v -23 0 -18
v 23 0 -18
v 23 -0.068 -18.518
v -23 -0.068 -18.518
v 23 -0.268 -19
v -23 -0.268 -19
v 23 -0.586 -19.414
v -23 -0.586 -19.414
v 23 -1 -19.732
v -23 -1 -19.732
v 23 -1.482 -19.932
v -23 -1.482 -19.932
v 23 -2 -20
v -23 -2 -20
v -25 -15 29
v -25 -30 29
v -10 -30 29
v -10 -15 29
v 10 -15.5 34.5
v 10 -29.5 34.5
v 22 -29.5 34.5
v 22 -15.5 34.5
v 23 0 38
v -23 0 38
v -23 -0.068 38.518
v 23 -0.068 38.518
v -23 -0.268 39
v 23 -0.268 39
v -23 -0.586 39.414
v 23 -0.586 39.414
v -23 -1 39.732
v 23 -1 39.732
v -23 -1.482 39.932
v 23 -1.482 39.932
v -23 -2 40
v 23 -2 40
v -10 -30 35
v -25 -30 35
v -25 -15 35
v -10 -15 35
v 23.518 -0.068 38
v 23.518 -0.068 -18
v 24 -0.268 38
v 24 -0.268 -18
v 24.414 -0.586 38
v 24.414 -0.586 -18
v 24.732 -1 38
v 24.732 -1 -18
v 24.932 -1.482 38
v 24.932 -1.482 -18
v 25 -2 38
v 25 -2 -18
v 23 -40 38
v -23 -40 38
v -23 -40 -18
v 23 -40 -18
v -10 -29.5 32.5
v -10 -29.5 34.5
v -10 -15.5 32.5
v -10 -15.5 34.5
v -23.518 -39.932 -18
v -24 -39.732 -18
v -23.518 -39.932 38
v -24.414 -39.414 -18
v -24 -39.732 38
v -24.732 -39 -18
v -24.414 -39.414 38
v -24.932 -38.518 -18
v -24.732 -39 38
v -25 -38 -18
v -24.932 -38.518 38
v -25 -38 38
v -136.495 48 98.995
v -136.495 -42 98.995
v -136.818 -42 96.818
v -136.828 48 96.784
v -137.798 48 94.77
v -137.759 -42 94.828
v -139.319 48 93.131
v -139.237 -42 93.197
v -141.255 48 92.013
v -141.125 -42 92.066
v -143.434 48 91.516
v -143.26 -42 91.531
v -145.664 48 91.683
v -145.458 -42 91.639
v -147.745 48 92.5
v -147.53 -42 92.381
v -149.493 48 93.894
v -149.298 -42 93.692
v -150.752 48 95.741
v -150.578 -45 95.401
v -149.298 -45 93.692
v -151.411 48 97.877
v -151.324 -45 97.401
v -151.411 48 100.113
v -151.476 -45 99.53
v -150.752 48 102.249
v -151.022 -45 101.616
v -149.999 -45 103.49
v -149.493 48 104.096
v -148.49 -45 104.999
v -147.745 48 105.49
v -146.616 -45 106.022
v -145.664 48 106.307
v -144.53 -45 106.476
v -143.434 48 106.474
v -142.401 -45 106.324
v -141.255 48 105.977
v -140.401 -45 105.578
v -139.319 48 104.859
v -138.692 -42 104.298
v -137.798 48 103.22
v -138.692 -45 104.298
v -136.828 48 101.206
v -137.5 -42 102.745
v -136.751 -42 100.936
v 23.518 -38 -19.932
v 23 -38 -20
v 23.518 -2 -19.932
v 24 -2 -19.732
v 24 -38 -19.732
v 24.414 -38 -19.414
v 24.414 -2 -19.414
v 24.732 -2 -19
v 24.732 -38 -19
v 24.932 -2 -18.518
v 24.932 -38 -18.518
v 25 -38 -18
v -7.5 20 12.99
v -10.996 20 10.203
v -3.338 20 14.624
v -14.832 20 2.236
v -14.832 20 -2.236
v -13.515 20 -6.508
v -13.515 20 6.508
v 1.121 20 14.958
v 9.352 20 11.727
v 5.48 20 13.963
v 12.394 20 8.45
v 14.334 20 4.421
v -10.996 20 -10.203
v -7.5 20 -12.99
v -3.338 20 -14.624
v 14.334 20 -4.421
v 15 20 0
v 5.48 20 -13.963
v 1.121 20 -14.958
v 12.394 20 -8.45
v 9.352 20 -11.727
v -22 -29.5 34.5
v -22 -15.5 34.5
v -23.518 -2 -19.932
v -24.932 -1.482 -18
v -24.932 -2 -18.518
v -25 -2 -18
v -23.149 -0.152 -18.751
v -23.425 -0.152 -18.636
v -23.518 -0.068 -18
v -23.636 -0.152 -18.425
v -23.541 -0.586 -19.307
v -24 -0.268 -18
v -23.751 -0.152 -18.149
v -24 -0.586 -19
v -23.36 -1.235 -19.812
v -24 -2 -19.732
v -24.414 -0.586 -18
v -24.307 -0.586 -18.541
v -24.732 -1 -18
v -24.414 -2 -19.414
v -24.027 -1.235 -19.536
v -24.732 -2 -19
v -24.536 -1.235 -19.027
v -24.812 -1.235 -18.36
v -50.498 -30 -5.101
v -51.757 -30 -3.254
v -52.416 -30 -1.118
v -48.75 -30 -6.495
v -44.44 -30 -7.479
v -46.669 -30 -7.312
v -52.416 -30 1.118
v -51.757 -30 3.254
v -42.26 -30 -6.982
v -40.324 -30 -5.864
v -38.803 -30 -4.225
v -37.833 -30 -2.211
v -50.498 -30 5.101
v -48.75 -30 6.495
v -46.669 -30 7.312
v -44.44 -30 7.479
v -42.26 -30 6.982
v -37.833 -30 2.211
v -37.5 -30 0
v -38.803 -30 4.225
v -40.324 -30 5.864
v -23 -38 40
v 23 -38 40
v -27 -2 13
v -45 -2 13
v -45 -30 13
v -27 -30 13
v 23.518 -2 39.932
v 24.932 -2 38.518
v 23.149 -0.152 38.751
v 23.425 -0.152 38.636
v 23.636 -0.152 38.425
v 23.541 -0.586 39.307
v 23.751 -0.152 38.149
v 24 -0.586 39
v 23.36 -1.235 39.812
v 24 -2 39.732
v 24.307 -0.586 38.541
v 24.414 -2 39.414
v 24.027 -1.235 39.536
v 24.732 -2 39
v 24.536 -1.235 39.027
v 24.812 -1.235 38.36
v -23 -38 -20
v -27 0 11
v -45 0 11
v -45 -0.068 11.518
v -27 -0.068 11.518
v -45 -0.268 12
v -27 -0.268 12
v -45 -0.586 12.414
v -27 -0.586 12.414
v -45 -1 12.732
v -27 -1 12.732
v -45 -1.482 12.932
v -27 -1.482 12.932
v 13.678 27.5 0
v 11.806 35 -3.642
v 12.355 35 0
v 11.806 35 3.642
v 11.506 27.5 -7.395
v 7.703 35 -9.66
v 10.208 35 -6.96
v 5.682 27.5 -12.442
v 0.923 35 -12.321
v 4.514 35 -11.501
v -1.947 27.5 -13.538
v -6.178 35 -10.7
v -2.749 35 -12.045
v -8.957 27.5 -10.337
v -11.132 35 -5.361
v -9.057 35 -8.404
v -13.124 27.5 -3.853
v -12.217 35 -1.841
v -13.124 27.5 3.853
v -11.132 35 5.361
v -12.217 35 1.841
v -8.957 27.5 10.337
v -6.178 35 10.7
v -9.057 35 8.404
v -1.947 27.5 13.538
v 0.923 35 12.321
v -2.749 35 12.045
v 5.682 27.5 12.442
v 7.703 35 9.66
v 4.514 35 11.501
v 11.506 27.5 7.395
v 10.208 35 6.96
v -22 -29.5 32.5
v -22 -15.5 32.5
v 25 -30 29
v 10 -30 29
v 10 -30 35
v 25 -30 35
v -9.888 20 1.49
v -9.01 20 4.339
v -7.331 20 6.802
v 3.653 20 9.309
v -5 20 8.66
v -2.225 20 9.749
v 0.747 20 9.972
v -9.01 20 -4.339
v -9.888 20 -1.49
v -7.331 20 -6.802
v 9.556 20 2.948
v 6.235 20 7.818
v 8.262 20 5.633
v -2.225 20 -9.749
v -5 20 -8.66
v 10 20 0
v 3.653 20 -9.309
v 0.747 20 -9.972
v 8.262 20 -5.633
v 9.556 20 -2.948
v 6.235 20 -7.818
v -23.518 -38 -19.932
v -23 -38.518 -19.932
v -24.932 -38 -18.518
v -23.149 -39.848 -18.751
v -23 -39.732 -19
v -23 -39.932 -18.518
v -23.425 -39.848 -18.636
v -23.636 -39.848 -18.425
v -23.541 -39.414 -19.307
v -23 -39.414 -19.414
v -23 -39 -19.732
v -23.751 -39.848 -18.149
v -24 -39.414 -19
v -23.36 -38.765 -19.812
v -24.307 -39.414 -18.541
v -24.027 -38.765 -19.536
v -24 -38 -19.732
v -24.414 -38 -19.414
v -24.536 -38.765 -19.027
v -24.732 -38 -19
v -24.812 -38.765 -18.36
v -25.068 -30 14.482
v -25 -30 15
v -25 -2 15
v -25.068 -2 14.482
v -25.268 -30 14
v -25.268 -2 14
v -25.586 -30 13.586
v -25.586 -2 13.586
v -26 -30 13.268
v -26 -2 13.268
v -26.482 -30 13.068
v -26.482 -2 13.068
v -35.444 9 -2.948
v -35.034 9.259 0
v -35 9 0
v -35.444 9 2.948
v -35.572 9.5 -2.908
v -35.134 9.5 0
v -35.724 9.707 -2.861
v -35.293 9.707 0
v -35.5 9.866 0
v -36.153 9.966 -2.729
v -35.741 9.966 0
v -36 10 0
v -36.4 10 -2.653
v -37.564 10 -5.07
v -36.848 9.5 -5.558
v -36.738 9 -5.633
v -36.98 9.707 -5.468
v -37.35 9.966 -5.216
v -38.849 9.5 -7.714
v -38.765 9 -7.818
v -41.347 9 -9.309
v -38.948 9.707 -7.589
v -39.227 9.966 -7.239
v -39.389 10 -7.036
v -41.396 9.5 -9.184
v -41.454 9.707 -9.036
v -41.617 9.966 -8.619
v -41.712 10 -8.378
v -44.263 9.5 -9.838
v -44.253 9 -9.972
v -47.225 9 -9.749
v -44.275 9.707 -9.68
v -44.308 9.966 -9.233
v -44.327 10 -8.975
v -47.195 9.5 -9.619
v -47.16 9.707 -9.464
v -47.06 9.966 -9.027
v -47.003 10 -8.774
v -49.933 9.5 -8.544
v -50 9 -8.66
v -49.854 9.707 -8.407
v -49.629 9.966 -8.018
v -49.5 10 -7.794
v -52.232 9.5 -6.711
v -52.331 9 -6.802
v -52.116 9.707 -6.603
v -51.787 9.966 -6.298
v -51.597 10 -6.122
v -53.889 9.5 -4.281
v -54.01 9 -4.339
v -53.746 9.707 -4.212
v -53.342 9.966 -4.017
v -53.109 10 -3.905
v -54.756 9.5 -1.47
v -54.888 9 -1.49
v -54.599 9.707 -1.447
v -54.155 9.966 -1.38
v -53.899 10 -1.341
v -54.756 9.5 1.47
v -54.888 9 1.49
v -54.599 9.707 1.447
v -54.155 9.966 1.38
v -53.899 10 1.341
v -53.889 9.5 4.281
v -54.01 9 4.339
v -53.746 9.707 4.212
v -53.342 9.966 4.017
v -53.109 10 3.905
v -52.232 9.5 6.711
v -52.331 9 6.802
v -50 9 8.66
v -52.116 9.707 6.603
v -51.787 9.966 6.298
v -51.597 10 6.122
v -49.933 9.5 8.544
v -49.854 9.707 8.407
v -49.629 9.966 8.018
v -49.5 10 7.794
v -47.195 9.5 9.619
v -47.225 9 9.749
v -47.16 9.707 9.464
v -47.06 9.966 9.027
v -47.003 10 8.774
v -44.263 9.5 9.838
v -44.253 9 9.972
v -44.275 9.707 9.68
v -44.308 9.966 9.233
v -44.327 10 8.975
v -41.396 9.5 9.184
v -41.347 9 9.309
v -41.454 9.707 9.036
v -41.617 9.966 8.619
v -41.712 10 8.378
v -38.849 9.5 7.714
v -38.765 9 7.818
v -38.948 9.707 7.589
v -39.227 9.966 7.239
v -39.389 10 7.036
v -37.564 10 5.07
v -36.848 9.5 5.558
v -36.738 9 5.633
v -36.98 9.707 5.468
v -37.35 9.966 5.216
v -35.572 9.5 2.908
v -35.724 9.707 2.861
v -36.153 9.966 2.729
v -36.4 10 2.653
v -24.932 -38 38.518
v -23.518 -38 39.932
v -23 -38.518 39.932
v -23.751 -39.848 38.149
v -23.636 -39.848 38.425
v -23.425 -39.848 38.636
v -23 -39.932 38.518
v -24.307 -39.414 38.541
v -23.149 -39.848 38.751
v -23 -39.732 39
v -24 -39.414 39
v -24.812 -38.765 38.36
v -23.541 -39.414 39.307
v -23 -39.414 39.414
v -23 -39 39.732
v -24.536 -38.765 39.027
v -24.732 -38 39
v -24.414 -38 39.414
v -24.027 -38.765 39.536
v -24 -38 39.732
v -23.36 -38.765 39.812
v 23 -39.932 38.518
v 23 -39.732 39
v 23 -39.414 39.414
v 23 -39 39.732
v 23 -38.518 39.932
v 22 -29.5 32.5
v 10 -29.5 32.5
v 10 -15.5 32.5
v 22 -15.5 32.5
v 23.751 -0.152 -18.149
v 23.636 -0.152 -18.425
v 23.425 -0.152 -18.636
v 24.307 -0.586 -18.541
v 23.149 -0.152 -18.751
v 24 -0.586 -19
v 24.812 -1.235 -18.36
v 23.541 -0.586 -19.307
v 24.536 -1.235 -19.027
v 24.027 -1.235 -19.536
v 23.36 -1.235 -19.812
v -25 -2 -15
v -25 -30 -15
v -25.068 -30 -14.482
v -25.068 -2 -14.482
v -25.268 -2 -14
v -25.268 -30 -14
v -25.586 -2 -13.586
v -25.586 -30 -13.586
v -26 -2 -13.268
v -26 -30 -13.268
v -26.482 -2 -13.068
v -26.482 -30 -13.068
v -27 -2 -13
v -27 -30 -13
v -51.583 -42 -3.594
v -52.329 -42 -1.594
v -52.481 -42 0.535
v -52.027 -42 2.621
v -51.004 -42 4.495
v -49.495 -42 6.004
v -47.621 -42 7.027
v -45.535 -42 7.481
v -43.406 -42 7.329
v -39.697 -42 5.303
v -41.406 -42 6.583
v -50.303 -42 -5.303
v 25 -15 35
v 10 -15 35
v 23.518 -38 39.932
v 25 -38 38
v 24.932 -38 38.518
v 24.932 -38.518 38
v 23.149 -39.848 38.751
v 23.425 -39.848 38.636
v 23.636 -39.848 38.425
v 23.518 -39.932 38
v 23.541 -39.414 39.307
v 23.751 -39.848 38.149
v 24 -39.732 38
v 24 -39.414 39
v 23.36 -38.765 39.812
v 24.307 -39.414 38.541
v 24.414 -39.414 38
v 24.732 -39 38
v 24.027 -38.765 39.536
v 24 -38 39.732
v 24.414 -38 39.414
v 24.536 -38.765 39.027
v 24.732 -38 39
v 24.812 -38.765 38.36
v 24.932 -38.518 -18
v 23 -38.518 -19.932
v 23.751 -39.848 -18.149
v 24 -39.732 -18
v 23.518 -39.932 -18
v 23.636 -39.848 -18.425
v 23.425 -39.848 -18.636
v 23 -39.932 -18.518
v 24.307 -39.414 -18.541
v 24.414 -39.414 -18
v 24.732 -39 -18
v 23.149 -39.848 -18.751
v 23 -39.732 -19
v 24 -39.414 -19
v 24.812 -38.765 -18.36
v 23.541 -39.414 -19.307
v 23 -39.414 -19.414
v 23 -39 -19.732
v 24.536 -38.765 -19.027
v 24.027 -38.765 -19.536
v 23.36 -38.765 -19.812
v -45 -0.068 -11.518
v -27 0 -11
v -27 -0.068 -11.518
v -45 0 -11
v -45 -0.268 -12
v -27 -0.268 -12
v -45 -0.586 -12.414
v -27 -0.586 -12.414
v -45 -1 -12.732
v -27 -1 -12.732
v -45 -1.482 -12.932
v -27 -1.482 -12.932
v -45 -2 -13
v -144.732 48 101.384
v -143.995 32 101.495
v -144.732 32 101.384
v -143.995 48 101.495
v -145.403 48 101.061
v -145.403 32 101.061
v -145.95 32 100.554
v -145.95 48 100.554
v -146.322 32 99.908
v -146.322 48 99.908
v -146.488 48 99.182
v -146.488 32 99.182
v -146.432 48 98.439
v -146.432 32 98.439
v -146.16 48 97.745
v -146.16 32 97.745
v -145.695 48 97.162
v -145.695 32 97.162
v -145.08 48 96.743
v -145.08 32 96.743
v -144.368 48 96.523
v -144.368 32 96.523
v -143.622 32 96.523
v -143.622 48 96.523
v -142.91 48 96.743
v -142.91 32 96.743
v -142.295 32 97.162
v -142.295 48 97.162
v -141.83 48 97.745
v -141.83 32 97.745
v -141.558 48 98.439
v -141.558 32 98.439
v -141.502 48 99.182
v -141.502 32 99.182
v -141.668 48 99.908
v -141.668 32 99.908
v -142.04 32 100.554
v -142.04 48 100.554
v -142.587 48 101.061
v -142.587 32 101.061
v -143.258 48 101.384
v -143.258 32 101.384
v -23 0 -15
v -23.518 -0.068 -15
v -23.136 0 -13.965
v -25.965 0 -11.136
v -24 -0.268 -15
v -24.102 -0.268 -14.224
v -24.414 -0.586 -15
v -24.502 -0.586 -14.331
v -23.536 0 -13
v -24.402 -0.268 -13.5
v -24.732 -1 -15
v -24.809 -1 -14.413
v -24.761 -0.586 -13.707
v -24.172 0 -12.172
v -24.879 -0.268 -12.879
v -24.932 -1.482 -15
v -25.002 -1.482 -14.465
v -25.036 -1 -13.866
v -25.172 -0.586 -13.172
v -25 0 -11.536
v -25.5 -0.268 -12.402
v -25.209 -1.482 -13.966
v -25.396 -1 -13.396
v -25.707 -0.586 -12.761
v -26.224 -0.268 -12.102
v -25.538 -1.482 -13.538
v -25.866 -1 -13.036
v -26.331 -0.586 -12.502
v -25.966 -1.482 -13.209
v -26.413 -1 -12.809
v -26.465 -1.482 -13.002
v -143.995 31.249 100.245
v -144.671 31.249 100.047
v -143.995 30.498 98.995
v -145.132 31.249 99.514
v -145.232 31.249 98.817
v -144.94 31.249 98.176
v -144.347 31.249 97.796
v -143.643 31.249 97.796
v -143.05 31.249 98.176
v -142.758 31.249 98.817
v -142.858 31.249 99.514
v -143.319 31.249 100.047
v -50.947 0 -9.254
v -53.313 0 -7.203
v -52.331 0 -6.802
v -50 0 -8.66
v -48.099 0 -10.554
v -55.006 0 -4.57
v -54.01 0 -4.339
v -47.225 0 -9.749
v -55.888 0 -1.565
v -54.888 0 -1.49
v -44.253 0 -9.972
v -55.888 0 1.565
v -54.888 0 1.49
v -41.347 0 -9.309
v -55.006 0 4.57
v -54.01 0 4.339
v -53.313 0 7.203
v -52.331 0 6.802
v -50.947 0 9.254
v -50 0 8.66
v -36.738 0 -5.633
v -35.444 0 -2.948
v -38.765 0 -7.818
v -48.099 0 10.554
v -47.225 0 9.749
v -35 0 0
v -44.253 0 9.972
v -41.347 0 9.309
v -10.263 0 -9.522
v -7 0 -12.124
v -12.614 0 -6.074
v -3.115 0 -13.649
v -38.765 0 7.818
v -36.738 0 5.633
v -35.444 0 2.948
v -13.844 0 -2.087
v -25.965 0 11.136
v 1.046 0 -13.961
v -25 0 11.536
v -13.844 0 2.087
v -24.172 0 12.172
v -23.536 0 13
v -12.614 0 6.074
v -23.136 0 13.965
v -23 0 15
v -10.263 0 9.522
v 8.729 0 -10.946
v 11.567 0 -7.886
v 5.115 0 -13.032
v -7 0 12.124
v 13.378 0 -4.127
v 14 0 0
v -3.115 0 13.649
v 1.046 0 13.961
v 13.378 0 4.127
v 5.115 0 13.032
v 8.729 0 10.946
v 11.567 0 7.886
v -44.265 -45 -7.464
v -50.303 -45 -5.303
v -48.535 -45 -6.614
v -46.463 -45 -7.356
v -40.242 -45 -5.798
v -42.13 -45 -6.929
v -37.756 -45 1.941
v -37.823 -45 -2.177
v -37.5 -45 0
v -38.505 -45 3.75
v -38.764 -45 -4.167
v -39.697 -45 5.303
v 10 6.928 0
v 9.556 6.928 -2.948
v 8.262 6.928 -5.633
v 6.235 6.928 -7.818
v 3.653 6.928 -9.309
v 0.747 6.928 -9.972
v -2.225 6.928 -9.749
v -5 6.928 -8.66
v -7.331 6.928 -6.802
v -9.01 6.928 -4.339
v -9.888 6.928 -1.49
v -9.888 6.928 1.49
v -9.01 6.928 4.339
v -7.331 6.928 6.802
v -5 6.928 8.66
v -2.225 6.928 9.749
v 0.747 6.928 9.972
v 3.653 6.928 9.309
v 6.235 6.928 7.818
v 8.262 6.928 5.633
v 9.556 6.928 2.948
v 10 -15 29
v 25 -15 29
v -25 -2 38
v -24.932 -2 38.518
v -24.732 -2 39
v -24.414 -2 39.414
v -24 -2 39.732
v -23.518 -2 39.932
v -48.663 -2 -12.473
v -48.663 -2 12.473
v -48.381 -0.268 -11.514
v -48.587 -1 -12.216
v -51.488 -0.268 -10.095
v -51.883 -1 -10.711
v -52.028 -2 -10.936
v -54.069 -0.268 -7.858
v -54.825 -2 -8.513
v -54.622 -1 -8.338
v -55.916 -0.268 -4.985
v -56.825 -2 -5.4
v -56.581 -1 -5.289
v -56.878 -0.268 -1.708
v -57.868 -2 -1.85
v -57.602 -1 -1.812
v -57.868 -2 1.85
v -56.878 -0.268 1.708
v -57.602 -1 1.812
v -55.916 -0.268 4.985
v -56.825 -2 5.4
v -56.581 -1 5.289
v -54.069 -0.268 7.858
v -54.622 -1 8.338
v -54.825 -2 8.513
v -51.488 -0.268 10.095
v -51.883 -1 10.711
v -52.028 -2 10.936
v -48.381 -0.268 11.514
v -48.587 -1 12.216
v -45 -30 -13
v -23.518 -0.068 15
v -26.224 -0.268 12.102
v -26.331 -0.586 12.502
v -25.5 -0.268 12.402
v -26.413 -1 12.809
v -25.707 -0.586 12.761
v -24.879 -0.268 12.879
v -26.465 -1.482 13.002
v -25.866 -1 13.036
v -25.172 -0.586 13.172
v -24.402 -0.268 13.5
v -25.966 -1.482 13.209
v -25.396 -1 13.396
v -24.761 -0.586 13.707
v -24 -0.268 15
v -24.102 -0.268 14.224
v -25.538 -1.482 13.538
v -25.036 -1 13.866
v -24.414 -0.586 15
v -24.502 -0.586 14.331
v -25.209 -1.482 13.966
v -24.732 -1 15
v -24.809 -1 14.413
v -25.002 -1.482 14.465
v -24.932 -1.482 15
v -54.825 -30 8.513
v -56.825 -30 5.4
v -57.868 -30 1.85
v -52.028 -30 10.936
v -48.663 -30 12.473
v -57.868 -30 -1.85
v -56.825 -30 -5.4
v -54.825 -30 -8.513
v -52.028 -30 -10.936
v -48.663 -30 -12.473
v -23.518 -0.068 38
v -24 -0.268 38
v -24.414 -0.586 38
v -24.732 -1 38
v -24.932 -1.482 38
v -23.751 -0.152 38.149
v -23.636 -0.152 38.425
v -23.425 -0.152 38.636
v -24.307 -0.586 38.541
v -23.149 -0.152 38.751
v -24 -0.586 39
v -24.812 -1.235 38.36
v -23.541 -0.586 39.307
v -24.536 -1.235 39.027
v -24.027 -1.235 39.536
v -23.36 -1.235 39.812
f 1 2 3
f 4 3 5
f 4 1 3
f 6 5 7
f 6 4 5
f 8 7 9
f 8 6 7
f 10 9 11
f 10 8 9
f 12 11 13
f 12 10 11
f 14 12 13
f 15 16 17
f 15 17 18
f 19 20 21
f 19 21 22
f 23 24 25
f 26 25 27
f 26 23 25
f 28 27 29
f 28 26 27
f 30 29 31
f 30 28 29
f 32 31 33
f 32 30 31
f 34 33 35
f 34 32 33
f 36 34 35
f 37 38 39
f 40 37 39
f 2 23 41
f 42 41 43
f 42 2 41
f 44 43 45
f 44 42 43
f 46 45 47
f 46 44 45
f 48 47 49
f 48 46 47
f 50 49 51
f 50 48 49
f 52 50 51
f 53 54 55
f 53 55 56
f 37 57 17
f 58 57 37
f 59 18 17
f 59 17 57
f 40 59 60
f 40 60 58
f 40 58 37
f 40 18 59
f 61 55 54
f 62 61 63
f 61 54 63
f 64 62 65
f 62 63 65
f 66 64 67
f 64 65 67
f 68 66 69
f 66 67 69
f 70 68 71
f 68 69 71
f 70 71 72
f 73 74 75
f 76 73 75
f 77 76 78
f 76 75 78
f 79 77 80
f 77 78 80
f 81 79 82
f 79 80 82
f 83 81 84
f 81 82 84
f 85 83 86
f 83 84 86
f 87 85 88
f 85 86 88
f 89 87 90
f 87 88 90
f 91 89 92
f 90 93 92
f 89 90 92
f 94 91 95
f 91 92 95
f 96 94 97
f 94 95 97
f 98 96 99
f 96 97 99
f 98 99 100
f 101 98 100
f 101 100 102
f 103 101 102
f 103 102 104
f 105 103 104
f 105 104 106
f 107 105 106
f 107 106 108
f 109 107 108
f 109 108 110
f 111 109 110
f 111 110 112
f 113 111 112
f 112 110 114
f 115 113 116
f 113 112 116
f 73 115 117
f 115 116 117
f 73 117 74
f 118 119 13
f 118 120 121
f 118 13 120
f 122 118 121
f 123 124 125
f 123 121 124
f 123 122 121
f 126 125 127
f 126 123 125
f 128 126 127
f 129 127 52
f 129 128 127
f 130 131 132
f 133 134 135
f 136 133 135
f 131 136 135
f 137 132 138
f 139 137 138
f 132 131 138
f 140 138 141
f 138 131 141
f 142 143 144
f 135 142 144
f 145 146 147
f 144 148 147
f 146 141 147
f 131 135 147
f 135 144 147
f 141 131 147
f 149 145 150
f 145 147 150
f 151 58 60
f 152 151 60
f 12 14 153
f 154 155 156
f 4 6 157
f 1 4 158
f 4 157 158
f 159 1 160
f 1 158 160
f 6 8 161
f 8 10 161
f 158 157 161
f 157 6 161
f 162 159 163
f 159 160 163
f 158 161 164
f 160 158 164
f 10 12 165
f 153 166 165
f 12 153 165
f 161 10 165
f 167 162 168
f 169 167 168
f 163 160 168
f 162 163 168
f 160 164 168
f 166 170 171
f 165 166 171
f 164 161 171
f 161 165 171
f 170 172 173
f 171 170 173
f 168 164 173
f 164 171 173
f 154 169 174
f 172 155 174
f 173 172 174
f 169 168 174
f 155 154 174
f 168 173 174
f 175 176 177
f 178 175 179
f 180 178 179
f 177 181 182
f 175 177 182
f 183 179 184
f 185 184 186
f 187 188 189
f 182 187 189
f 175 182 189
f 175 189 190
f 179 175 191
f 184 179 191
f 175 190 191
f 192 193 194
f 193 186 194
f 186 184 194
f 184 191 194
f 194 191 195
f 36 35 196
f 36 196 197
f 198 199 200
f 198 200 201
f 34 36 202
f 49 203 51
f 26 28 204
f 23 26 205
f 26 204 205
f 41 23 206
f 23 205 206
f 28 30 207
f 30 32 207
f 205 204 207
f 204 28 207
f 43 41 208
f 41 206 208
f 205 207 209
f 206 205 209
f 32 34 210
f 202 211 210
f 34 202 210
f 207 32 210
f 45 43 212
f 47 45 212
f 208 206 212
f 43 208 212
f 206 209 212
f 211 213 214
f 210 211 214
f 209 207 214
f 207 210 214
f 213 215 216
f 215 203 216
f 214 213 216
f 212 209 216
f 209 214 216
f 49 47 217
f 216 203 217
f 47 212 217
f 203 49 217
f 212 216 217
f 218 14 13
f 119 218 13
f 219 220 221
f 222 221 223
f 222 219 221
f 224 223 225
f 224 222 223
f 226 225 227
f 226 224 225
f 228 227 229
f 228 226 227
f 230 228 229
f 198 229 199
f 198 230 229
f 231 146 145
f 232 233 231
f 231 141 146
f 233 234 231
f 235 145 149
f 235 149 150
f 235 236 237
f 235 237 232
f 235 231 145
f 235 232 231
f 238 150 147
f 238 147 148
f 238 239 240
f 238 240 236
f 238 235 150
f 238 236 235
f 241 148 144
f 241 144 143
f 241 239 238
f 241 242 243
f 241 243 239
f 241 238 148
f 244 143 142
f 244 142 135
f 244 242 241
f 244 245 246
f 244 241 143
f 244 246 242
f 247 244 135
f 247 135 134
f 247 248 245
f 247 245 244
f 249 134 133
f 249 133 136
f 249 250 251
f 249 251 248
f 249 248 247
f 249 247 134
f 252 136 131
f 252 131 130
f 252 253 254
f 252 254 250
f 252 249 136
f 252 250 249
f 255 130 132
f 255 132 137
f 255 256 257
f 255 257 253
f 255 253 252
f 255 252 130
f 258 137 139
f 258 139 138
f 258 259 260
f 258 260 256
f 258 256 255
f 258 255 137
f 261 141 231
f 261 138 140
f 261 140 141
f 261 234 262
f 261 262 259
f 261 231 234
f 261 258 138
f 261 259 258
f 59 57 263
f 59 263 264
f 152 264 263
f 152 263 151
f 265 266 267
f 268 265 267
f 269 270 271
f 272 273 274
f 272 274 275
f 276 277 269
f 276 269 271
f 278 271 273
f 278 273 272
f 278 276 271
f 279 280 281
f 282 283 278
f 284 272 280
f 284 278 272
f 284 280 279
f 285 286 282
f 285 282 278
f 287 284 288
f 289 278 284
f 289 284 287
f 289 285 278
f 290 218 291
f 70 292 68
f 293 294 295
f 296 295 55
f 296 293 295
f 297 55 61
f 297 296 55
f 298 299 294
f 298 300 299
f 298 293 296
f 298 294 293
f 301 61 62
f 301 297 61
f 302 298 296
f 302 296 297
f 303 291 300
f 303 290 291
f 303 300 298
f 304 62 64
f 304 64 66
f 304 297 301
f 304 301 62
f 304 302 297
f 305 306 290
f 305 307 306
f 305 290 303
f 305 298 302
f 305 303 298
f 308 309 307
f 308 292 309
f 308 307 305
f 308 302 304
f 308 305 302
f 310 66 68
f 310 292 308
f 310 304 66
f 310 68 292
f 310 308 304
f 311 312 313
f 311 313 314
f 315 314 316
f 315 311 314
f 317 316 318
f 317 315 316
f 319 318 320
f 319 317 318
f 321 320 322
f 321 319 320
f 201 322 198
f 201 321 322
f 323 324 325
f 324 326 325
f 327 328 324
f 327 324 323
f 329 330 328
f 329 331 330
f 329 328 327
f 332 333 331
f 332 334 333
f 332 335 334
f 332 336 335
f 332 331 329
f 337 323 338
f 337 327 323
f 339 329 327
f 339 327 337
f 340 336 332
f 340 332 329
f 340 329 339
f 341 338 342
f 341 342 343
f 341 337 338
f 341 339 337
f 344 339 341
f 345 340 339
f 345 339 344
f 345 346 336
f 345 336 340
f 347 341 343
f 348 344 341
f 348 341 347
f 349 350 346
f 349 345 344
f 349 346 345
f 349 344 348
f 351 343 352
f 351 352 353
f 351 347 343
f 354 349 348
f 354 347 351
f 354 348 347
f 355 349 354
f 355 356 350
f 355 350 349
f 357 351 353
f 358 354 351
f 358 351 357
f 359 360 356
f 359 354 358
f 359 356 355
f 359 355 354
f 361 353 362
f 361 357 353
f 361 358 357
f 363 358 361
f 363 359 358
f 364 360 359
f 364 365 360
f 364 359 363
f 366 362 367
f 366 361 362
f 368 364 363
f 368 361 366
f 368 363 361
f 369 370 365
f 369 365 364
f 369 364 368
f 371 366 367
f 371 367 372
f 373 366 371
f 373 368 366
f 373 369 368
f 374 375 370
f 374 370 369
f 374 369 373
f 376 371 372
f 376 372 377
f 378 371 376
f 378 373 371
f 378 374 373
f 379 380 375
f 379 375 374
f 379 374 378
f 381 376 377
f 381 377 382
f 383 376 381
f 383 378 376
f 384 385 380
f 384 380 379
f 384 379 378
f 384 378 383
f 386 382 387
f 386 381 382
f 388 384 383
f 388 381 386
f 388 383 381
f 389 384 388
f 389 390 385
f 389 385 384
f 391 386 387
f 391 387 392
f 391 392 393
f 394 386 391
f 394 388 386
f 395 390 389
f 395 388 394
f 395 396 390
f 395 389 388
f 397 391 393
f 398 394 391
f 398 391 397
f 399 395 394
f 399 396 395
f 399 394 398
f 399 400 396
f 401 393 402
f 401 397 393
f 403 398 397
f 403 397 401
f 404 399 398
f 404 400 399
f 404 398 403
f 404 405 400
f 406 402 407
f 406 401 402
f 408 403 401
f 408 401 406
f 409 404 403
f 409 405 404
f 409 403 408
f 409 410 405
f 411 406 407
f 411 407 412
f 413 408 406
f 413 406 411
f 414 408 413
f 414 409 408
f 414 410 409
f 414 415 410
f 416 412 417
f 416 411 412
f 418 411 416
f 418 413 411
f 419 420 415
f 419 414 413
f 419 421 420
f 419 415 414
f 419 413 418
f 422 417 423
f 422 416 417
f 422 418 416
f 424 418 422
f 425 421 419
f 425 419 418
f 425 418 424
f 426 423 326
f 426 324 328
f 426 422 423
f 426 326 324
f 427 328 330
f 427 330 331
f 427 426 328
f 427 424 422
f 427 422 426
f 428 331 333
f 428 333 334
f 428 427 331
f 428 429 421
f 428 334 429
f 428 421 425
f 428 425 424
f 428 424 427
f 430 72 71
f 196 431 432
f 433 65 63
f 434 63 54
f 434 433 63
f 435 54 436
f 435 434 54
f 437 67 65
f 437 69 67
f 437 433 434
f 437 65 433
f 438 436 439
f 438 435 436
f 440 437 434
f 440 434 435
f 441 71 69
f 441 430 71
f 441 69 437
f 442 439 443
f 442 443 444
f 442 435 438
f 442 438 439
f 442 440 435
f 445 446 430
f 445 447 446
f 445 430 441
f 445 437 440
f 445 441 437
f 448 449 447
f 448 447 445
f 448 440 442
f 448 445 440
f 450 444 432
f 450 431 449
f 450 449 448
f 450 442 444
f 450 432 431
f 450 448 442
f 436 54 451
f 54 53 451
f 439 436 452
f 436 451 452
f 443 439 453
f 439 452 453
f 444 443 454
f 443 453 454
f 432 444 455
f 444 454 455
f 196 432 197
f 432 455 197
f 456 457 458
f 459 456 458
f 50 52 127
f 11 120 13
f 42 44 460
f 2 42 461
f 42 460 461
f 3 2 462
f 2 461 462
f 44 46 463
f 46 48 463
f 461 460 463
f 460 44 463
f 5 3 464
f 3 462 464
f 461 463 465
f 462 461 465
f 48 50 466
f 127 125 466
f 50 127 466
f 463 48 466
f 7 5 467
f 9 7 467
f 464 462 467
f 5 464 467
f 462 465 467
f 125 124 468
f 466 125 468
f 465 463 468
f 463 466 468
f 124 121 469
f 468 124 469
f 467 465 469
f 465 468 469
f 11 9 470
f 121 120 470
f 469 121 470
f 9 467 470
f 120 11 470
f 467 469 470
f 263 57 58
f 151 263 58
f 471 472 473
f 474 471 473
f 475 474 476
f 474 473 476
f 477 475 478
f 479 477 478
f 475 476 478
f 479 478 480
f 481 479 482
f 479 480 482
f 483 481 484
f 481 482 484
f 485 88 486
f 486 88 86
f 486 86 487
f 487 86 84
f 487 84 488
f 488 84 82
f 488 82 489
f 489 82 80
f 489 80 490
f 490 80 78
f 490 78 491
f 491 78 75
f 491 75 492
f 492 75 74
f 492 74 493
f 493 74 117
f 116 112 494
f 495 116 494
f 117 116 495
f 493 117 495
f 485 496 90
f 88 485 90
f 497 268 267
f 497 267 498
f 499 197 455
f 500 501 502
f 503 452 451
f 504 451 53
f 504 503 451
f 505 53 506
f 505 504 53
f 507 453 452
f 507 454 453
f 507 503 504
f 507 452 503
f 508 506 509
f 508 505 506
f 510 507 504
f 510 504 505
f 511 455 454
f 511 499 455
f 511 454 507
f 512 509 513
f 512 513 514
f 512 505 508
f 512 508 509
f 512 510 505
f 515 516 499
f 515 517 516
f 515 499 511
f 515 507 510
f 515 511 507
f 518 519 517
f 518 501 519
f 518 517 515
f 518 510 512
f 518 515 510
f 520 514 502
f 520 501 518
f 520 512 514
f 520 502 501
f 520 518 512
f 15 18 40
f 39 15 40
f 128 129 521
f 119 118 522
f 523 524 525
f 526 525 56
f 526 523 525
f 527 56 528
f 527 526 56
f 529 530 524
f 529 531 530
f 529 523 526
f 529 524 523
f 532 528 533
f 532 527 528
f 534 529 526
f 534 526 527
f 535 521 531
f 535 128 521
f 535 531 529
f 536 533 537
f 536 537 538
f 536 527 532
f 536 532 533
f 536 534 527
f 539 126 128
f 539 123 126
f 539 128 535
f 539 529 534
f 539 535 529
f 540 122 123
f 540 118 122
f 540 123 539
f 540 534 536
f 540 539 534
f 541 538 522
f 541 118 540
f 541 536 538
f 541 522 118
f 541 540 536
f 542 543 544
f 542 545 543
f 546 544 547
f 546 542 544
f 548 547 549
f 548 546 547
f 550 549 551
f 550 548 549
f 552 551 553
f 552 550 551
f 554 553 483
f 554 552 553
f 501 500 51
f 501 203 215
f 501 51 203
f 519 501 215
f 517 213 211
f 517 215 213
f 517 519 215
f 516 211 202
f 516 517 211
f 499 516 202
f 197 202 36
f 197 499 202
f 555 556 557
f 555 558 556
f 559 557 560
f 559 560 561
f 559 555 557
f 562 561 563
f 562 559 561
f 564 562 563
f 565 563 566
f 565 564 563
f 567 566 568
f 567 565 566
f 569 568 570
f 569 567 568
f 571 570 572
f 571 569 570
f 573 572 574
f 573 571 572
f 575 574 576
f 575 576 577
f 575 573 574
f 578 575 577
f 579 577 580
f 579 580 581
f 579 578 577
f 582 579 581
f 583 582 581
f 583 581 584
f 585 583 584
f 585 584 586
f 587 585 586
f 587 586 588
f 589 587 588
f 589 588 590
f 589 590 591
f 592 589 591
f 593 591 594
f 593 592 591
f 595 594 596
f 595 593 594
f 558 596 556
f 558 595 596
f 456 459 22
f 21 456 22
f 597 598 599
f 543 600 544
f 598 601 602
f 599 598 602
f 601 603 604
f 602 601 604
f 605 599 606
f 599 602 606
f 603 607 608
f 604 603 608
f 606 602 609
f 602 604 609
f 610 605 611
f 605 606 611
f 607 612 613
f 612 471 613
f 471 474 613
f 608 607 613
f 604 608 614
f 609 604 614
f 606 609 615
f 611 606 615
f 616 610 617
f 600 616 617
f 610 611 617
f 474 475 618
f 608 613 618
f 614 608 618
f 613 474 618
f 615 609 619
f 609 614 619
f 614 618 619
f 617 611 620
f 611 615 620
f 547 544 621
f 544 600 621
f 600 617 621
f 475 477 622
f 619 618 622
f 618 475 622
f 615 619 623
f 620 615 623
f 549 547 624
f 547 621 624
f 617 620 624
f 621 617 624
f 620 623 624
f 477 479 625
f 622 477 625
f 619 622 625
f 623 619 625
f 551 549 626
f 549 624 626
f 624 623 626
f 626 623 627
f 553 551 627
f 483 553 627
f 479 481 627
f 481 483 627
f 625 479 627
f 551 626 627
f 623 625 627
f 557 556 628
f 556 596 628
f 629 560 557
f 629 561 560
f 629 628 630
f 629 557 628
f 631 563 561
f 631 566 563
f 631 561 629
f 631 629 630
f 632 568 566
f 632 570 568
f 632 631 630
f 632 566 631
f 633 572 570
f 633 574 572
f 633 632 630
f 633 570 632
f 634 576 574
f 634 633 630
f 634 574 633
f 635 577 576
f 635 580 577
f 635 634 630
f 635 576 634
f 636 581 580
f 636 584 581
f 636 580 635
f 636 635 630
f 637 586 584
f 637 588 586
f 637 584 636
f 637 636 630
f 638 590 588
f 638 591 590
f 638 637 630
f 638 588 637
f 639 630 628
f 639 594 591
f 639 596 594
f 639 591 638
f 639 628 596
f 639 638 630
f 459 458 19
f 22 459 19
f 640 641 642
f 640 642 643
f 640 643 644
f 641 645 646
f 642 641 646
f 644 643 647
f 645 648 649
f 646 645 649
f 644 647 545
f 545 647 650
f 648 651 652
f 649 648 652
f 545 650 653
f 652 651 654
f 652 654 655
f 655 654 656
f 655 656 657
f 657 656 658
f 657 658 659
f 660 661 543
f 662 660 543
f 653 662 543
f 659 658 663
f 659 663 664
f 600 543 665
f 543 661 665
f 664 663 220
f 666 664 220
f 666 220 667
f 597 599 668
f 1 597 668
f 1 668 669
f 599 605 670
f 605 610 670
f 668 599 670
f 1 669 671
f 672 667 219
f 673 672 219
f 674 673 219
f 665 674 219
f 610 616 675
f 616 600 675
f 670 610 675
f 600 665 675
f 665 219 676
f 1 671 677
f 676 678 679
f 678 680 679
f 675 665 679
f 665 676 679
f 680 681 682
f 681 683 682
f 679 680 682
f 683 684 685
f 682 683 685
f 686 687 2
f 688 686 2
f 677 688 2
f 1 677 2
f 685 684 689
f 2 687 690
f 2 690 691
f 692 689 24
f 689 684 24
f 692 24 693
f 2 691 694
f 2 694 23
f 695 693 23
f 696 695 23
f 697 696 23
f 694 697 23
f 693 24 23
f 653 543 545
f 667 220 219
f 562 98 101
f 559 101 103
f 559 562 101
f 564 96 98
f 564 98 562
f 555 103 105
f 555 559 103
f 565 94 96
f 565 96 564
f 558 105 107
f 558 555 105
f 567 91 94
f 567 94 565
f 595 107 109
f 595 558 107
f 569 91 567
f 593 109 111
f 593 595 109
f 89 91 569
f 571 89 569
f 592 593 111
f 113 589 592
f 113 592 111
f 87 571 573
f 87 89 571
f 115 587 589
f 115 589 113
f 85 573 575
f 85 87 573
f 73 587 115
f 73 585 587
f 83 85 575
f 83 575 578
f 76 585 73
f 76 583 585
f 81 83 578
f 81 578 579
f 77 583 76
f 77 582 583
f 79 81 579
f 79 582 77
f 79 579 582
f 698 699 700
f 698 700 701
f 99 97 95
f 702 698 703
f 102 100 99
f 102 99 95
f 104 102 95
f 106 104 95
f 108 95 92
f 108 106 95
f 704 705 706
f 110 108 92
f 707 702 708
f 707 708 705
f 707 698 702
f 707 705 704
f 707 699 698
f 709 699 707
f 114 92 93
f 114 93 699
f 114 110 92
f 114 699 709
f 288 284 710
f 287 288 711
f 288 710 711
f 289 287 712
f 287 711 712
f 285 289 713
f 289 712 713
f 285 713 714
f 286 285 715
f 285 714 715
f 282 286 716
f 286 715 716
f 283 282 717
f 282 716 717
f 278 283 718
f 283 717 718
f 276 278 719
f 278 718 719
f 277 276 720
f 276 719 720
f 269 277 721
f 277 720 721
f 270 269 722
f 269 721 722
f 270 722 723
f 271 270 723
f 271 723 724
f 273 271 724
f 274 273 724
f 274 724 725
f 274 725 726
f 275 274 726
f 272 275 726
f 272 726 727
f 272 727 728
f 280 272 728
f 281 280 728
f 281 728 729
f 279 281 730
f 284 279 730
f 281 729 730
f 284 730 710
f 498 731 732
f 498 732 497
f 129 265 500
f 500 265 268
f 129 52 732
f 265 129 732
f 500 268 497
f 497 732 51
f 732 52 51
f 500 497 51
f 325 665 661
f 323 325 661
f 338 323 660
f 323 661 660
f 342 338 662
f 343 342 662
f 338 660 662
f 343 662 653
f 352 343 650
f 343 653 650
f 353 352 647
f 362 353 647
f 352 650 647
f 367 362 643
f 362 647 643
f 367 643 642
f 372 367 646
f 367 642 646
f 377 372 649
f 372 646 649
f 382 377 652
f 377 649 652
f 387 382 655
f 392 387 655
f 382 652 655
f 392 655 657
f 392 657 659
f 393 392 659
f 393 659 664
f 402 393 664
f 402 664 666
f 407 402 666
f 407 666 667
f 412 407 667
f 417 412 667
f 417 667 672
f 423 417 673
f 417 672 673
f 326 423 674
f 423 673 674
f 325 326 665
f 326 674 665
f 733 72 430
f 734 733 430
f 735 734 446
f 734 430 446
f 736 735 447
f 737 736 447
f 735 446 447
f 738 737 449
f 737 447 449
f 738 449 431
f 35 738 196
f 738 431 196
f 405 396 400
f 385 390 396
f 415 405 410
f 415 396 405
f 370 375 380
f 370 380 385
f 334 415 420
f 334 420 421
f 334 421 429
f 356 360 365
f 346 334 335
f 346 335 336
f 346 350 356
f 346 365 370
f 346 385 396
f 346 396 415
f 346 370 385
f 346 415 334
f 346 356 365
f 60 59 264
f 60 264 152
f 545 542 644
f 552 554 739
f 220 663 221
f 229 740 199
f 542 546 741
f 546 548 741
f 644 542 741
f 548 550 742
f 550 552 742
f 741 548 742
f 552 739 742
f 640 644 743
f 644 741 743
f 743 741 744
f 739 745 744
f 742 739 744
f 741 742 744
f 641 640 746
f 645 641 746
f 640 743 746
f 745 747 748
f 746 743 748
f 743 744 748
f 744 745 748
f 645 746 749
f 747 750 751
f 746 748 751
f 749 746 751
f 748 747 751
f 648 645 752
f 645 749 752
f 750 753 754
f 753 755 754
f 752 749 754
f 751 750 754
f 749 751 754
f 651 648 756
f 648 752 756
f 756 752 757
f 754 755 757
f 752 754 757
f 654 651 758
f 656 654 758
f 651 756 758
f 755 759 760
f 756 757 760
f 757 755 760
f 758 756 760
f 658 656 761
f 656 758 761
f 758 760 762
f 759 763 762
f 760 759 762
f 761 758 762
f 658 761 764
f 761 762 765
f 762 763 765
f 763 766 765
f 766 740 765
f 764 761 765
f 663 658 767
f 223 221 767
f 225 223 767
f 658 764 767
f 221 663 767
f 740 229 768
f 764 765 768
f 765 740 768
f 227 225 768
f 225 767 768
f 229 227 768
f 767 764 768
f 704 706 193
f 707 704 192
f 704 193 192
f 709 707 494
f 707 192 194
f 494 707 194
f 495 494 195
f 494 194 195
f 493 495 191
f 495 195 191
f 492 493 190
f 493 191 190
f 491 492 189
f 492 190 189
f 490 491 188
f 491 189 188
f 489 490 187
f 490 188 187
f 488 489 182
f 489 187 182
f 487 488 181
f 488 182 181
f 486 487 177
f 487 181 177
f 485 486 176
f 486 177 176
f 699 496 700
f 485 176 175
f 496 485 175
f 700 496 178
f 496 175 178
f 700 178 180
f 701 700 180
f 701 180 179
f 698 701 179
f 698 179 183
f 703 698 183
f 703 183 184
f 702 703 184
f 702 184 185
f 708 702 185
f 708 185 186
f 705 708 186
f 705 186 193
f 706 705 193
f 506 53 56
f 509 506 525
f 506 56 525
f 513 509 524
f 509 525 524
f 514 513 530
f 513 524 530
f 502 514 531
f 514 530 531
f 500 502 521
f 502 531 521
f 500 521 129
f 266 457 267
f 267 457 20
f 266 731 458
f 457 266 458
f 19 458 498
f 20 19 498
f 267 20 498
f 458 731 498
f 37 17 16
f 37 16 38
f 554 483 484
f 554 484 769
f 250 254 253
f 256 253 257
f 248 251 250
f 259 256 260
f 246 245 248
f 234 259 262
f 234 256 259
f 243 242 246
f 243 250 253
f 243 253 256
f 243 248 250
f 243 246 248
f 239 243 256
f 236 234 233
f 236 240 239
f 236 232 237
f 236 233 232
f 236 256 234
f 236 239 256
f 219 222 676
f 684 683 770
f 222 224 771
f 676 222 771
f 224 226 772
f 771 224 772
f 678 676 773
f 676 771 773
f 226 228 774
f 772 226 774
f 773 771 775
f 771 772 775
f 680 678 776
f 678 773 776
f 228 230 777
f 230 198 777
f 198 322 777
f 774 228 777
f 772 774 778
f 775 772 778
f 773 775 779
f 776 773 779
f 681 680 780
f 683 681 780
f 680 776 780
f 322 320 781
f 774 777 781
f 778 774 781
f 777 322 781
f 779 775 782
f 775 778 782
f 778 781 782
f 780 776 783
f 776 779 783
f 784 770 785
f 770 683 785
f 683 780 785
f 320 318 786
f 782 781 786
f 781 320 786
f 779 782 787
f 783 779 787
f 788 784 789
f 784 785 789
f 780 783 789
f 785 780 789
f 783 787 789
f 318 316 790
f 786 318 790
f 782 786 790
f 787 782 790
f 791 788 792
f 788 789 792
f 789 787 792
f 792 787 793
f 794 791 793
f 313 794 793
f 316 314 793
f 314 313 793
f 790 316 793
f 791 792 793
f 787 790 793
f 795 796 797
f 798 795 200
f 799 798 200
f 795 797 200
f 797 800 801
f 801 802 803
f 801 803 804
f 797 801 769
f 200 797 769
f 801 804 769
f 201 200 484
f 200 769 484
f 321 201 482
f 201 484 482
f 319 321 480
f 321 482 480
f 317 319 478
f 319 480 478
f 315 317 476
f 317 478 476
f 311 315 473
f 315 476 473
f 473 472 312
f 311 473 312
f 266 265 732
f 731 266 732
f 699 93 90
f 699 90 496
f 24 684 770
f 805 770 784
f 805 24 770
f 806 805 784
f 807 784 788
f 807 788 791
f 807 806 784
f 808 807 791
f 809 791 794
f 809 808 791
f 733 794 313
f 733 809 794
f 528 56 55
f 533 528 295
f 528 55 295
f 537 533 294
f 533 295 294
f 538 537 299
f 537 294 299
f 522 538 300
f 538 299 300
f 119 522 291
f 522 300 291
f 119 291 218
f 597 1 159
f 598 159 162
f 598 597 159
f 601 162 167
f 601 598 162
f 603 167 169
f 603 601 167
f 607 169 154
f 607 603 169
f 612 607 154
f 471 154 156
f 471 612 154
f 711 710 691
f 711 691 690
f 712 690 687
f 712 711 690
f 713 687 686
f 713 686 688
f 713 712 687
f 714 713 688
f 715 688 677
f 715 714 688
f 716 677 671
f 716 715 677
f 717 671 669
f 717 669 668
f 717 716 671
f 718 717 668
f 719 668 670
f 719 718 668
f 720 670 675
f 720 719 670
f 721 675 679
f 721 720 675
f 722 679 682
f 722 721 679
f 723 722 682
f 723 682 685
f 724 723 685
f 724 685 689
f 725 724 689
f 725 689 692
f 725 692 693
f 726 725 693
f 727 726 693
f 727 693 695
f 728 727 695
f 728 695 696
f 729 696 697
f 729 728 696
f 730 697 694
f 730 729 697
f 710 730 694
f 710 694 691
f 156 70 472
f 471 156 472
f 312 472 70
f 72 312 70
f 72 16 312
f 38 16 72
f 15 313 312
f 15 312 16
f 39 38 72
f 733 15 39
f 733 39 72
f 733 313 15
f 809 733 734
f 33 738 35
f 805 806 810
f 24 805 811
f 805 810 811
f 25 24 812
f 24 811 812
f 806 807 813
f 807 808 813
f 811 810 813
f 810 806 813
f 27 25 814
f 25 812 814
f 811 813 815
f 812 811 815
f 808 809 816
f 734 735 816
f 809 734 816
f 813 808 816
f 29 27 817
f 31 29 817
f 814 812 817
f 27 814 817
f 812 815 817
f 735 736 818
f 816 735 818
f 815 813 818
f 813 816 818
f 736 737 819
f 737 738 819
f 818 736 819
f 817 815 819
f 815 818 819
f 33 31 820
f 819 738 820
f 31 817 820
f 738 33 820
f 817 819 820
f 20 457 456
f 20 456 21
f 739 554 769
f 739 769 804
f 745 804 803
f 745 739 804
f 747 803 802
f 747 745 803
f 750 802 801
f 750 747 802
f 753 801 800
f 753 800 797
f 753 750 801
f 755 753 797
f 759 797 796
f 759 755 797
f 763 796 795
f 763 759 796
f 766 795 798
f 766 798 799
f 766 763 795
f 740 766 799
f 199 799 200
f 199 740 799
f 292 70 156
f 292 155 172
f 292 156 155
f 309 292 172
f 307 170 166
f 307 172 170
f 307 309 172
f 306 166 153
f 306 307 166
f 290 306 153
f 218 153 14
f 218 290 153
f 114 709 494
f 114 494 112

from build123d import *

# Parameters (mm, degrees)
SKETCH1_R                = 10
BOSS_EXTRUDE1_DEPTH      = 20
SKETCH2_W                = 50
SKETCH2_H                = 60
BOSS_EXTRUDE2_DEPTH      = 40
SKETCH3_R                = 10
BOSS_EXTRUDE3_DEPTH      = 30
BOSS_EXTRUDE4_DEPTH      = 10
BOSS_EXTRUDE4_DEPTH_BACK = 30
SKETCH3_2_R              = 10
SKETCH4_R                = 15
BOSS_EXTRUDE5_DEPTH      = 15
BOSS_EXTRUDE5_TAPER      = 10
SKETCH6_W                = 6
SKETCH6_H                = 15
CUT_EXTRUDE1_DEPTH       = 15
SKETCH7_W                = 2
SKETCH7_H                = 14
BOSS_EXTRUDE6_DEPTH      = 12
CHAMFER1_SIZE            = 4
CHAMFER1_SIZE2           = 6.92820323
FILLET1_R                = 1
FILLET2_R                = 2
FILLET3_R                = 2
SKETCH8_R                = 7.5
BOSS_EXTRUDE7_DEPTH      = 15
SKETCH9_R                = 7.5
BOSS_EXTRUDE8_DEPTH      = 3
SKETCH10_R               = 7.5
BOSS_EXTRUDE9_DEPTH      = 90


with BuildPart() as part:
    # Sketch1 → Boss-Extrude1 (new body)
    with BuildSketch(Plane(origin=(0, 0, 0), x_dir=(1, 0, 0), z_dir=(0, 1, 0))):
        Circle(SKETCH1_R)
    extrude(amount=BOSS_EXTRUDE1_DEPTH)

    # Sketch2 → Boss-Extrude2 (add)
    with BuildSketch(Plane.XZ):
        with Locations((0, 10)):
            Rectangle(SKETCH2_W, SKETCH2_H)
    extrude(amount=BOSS_EXTRUDE2_DEPTH)

    # Sketch3 → Boss-Extrude3 (add)
    with BuildSketch(Plane(origin=(0, 0, 0), x_dir=(1, 0, 0), z_dir=(0, 1, 0))):
        with BuildLine():
            Line((-45, -13), (-25, -13))
            Line((-25, -13), (-25, 13))
            Line((-25, 13), (-45, 13))
            ThreePointArc((-45, 13), (-58, 0), (-45, -13))
        make_face()
        with Locations((-45, 0)):
            Circle(SKETCH3_R, mode=Mode.SUBTRACT)
    extrude(amount=-BOSS_EXTRUDE3_DEPTH)

    # Sketch3<2> → Boss-Extrude4 (add, two sides: drawn at the far end of the back side and taken through both)
    with BuildSketch(Plane(origin=(0, 0, 0), x_dir=(1, 0, 0), z_dir=(0, 1, 0)).offset(-BOSS_EXTRUDE4_DEPTH_BACK)):
        with Locations((-45, 0)):
            Circle(SKETCH3_2_R)
    extrude(amount=BOSS_EXTRUDE4_DEPTH + BOSS_EXTRUDE4_DEPTH_BACK)

    # Sketch6 → Cut-Extrude1 (cut)
    with BuildSketch(Plane.ZY.offset(25)):
        with Locations((32, -22.5)):
            Rectangle(SKETCH6_W, SKETCH6_H)
    cut_extrude1 = extrude(amount=-CUT_EXTRUDE1_DEPTH, mode=Mode.SUBTRACT)

    # Sketch7 → Boss-Extrude6 (add)
    with BuildSketch(Plane.ZY.offset(10)):
        with Locations((33.5, -22.5)):
            Rectangle(SKETCH7_W, SKETCH7_H)
    boss_extrude6 = extrude(amount=BOSS_EXTRUDE6_DEPTH)

    # Chamfer1
    chamfer1_edges = [part.edges().sort_by_distance(p)[0] for p in [
        (-10, 0, 0),
    ]]
    chamfer1_side = [part.faces().sort_by_distance(p)[0] for p in [
        (-5.534557326, 0, 9.502252838),
    ]]
    chamfer(chamfer1_edges, length=CHAMFER1_SIZE, length2=CHAMFER1_SIZE2, reference=chamfer1_side[0])

    # Fillet1
    fillet1_edges = [part.edges().sort_by_distance(p)[0] for p in [
        (-55, 10, 0),
    ]]
    fillet(fillet1_edges, radius=FILLET1_R)

    # Fillet2
    fillet2_edges = [part.edges().sort_by_distance(p)[0] for p in [
        (25, -20, 40),
        (-25, -20, 40),
        (-25, -15, -13),
        (-25, -20, -20),
        (25, -20, -20),
        (-25, -15, 13),
    ]]
    fillet(fillet2_edges, radius=FILLET2_R)

    # Fillet3
    fillet3_edges = [part.edges().sort_by_distance(p)[0] for p in [
        (-24.414213562, -40, 39.414213562),
        (0, -40, 40),
        (24.414213562, -40, 39.414213562),
        (25, -40, 10),
        (24.414213562, -40, -19.414213562),
        (0, -40, -20),
        (-24.414213562, -40, -19.414213562),
        (-58, 0, 0),
        (-36, 0, -13),
        (-25.585786438, 0, -13.585786438),
        (-25, 0, -16.5),
        (-24.414213562, 0, -19.414213562),
        (0, 0, -20),
        (24.414213562, 0, -19.414213562),
        (25, 0, 10),
        (24.414213562, 0, 39.414213562),
        (0, 0, 40),
        (-24.414213562, 0, 39.414213562),
        (-25, 0, 26.5),
        (-25.585786438, 0, 13.585786438),
        (-25, -40, 10),
        (-36, 0, 13),
    ]]
    fillet(fillet3_edges, radius=FILLET3_R)

    # Mirror1: Cut-Extrude1, Boss-Extrude6 across plane
    add(cut_extrude1.mirror(Plane(origin=(0, 0, 0), x_dir=(0, 0, 1), z_dir=(1, 0, 0))), mode=Mode.SUBTRACT)
    add(boss_extrude6.mirror(Plane(origin=(0, 0, 0), x_dir=(0, 0, 1), z_dir=(1, 0, 0))))


with BuildPart() as body_2:
    # Sketch4 → Boss-Extrude5 (new body)
    with BuildSketch(Plane(origin=(0, 20, 0), x_dir=(1, 0, 0), z_dir=(0, 1, 0))):
        Circle(SKETCH4_R)
    extrude(amount=BOSS_EXTRUDE5_DEPTH, taper=BOSS_EXTRUDE5_TAPER)


with BuildPart() as body_3:
    # Sketch8 → Boss-Extrude7 (new body)
    with BuildSketch(Plane.XZ.offset(30)):
        with Locations((-45, 0)):
            Circle(SKETCH8_R)
    extrude(amount=BOSS_EXTRUDE7_DEPTH)

    # Sketch9 → Boss-Extrude8 (add)
    with BuildSketch(Plane.XZ.offset(45)):
        with Locations((-143.994949366, 98.994949366)):
            Circle(SKETCH9_R)
        Polygon((-50.303300859, -5.303300859), (-39.696699141, 5.303300859), (-138.691648507, 104.298250225), (-149.298250225, 93.691648507), align=None)
    extrude(amount=-BOSS_EXTRUDE8_DEPTH)

    # Sketch10 → Boss-Extrude9 (add)
    with BuildSketch(Plane(origin=(0, -42, 0), x_dir=(1, 0, 0), z_dir=(0, 1, 0))):
        with Locations((-143.994949366, -98.994949366)):
            Circle(SKETCH10_R)
    extrude(amount=BOSS_EXTRUDE9_DEPTH)

    # Sketch14 → M6 Tapped Hole1 (revolve, cut)
    with BuildSketch(Plane(origin=(-143.994949366, 48, 98.994949366), x_dir=(0, 0, 1), z_dir=(1, 0, 0))):
        Polygon((0, 0), (0, 17.502151548), (2.5, 16), (2.5, 0), align=None)
    revolve(axis=Axis((-143.994949366, 54.35, 98.994949366), (0, -1, 0)), mode=Mode.SUBTRACT)


solid = Compound([part.part, body_2.part, body_3.part])
